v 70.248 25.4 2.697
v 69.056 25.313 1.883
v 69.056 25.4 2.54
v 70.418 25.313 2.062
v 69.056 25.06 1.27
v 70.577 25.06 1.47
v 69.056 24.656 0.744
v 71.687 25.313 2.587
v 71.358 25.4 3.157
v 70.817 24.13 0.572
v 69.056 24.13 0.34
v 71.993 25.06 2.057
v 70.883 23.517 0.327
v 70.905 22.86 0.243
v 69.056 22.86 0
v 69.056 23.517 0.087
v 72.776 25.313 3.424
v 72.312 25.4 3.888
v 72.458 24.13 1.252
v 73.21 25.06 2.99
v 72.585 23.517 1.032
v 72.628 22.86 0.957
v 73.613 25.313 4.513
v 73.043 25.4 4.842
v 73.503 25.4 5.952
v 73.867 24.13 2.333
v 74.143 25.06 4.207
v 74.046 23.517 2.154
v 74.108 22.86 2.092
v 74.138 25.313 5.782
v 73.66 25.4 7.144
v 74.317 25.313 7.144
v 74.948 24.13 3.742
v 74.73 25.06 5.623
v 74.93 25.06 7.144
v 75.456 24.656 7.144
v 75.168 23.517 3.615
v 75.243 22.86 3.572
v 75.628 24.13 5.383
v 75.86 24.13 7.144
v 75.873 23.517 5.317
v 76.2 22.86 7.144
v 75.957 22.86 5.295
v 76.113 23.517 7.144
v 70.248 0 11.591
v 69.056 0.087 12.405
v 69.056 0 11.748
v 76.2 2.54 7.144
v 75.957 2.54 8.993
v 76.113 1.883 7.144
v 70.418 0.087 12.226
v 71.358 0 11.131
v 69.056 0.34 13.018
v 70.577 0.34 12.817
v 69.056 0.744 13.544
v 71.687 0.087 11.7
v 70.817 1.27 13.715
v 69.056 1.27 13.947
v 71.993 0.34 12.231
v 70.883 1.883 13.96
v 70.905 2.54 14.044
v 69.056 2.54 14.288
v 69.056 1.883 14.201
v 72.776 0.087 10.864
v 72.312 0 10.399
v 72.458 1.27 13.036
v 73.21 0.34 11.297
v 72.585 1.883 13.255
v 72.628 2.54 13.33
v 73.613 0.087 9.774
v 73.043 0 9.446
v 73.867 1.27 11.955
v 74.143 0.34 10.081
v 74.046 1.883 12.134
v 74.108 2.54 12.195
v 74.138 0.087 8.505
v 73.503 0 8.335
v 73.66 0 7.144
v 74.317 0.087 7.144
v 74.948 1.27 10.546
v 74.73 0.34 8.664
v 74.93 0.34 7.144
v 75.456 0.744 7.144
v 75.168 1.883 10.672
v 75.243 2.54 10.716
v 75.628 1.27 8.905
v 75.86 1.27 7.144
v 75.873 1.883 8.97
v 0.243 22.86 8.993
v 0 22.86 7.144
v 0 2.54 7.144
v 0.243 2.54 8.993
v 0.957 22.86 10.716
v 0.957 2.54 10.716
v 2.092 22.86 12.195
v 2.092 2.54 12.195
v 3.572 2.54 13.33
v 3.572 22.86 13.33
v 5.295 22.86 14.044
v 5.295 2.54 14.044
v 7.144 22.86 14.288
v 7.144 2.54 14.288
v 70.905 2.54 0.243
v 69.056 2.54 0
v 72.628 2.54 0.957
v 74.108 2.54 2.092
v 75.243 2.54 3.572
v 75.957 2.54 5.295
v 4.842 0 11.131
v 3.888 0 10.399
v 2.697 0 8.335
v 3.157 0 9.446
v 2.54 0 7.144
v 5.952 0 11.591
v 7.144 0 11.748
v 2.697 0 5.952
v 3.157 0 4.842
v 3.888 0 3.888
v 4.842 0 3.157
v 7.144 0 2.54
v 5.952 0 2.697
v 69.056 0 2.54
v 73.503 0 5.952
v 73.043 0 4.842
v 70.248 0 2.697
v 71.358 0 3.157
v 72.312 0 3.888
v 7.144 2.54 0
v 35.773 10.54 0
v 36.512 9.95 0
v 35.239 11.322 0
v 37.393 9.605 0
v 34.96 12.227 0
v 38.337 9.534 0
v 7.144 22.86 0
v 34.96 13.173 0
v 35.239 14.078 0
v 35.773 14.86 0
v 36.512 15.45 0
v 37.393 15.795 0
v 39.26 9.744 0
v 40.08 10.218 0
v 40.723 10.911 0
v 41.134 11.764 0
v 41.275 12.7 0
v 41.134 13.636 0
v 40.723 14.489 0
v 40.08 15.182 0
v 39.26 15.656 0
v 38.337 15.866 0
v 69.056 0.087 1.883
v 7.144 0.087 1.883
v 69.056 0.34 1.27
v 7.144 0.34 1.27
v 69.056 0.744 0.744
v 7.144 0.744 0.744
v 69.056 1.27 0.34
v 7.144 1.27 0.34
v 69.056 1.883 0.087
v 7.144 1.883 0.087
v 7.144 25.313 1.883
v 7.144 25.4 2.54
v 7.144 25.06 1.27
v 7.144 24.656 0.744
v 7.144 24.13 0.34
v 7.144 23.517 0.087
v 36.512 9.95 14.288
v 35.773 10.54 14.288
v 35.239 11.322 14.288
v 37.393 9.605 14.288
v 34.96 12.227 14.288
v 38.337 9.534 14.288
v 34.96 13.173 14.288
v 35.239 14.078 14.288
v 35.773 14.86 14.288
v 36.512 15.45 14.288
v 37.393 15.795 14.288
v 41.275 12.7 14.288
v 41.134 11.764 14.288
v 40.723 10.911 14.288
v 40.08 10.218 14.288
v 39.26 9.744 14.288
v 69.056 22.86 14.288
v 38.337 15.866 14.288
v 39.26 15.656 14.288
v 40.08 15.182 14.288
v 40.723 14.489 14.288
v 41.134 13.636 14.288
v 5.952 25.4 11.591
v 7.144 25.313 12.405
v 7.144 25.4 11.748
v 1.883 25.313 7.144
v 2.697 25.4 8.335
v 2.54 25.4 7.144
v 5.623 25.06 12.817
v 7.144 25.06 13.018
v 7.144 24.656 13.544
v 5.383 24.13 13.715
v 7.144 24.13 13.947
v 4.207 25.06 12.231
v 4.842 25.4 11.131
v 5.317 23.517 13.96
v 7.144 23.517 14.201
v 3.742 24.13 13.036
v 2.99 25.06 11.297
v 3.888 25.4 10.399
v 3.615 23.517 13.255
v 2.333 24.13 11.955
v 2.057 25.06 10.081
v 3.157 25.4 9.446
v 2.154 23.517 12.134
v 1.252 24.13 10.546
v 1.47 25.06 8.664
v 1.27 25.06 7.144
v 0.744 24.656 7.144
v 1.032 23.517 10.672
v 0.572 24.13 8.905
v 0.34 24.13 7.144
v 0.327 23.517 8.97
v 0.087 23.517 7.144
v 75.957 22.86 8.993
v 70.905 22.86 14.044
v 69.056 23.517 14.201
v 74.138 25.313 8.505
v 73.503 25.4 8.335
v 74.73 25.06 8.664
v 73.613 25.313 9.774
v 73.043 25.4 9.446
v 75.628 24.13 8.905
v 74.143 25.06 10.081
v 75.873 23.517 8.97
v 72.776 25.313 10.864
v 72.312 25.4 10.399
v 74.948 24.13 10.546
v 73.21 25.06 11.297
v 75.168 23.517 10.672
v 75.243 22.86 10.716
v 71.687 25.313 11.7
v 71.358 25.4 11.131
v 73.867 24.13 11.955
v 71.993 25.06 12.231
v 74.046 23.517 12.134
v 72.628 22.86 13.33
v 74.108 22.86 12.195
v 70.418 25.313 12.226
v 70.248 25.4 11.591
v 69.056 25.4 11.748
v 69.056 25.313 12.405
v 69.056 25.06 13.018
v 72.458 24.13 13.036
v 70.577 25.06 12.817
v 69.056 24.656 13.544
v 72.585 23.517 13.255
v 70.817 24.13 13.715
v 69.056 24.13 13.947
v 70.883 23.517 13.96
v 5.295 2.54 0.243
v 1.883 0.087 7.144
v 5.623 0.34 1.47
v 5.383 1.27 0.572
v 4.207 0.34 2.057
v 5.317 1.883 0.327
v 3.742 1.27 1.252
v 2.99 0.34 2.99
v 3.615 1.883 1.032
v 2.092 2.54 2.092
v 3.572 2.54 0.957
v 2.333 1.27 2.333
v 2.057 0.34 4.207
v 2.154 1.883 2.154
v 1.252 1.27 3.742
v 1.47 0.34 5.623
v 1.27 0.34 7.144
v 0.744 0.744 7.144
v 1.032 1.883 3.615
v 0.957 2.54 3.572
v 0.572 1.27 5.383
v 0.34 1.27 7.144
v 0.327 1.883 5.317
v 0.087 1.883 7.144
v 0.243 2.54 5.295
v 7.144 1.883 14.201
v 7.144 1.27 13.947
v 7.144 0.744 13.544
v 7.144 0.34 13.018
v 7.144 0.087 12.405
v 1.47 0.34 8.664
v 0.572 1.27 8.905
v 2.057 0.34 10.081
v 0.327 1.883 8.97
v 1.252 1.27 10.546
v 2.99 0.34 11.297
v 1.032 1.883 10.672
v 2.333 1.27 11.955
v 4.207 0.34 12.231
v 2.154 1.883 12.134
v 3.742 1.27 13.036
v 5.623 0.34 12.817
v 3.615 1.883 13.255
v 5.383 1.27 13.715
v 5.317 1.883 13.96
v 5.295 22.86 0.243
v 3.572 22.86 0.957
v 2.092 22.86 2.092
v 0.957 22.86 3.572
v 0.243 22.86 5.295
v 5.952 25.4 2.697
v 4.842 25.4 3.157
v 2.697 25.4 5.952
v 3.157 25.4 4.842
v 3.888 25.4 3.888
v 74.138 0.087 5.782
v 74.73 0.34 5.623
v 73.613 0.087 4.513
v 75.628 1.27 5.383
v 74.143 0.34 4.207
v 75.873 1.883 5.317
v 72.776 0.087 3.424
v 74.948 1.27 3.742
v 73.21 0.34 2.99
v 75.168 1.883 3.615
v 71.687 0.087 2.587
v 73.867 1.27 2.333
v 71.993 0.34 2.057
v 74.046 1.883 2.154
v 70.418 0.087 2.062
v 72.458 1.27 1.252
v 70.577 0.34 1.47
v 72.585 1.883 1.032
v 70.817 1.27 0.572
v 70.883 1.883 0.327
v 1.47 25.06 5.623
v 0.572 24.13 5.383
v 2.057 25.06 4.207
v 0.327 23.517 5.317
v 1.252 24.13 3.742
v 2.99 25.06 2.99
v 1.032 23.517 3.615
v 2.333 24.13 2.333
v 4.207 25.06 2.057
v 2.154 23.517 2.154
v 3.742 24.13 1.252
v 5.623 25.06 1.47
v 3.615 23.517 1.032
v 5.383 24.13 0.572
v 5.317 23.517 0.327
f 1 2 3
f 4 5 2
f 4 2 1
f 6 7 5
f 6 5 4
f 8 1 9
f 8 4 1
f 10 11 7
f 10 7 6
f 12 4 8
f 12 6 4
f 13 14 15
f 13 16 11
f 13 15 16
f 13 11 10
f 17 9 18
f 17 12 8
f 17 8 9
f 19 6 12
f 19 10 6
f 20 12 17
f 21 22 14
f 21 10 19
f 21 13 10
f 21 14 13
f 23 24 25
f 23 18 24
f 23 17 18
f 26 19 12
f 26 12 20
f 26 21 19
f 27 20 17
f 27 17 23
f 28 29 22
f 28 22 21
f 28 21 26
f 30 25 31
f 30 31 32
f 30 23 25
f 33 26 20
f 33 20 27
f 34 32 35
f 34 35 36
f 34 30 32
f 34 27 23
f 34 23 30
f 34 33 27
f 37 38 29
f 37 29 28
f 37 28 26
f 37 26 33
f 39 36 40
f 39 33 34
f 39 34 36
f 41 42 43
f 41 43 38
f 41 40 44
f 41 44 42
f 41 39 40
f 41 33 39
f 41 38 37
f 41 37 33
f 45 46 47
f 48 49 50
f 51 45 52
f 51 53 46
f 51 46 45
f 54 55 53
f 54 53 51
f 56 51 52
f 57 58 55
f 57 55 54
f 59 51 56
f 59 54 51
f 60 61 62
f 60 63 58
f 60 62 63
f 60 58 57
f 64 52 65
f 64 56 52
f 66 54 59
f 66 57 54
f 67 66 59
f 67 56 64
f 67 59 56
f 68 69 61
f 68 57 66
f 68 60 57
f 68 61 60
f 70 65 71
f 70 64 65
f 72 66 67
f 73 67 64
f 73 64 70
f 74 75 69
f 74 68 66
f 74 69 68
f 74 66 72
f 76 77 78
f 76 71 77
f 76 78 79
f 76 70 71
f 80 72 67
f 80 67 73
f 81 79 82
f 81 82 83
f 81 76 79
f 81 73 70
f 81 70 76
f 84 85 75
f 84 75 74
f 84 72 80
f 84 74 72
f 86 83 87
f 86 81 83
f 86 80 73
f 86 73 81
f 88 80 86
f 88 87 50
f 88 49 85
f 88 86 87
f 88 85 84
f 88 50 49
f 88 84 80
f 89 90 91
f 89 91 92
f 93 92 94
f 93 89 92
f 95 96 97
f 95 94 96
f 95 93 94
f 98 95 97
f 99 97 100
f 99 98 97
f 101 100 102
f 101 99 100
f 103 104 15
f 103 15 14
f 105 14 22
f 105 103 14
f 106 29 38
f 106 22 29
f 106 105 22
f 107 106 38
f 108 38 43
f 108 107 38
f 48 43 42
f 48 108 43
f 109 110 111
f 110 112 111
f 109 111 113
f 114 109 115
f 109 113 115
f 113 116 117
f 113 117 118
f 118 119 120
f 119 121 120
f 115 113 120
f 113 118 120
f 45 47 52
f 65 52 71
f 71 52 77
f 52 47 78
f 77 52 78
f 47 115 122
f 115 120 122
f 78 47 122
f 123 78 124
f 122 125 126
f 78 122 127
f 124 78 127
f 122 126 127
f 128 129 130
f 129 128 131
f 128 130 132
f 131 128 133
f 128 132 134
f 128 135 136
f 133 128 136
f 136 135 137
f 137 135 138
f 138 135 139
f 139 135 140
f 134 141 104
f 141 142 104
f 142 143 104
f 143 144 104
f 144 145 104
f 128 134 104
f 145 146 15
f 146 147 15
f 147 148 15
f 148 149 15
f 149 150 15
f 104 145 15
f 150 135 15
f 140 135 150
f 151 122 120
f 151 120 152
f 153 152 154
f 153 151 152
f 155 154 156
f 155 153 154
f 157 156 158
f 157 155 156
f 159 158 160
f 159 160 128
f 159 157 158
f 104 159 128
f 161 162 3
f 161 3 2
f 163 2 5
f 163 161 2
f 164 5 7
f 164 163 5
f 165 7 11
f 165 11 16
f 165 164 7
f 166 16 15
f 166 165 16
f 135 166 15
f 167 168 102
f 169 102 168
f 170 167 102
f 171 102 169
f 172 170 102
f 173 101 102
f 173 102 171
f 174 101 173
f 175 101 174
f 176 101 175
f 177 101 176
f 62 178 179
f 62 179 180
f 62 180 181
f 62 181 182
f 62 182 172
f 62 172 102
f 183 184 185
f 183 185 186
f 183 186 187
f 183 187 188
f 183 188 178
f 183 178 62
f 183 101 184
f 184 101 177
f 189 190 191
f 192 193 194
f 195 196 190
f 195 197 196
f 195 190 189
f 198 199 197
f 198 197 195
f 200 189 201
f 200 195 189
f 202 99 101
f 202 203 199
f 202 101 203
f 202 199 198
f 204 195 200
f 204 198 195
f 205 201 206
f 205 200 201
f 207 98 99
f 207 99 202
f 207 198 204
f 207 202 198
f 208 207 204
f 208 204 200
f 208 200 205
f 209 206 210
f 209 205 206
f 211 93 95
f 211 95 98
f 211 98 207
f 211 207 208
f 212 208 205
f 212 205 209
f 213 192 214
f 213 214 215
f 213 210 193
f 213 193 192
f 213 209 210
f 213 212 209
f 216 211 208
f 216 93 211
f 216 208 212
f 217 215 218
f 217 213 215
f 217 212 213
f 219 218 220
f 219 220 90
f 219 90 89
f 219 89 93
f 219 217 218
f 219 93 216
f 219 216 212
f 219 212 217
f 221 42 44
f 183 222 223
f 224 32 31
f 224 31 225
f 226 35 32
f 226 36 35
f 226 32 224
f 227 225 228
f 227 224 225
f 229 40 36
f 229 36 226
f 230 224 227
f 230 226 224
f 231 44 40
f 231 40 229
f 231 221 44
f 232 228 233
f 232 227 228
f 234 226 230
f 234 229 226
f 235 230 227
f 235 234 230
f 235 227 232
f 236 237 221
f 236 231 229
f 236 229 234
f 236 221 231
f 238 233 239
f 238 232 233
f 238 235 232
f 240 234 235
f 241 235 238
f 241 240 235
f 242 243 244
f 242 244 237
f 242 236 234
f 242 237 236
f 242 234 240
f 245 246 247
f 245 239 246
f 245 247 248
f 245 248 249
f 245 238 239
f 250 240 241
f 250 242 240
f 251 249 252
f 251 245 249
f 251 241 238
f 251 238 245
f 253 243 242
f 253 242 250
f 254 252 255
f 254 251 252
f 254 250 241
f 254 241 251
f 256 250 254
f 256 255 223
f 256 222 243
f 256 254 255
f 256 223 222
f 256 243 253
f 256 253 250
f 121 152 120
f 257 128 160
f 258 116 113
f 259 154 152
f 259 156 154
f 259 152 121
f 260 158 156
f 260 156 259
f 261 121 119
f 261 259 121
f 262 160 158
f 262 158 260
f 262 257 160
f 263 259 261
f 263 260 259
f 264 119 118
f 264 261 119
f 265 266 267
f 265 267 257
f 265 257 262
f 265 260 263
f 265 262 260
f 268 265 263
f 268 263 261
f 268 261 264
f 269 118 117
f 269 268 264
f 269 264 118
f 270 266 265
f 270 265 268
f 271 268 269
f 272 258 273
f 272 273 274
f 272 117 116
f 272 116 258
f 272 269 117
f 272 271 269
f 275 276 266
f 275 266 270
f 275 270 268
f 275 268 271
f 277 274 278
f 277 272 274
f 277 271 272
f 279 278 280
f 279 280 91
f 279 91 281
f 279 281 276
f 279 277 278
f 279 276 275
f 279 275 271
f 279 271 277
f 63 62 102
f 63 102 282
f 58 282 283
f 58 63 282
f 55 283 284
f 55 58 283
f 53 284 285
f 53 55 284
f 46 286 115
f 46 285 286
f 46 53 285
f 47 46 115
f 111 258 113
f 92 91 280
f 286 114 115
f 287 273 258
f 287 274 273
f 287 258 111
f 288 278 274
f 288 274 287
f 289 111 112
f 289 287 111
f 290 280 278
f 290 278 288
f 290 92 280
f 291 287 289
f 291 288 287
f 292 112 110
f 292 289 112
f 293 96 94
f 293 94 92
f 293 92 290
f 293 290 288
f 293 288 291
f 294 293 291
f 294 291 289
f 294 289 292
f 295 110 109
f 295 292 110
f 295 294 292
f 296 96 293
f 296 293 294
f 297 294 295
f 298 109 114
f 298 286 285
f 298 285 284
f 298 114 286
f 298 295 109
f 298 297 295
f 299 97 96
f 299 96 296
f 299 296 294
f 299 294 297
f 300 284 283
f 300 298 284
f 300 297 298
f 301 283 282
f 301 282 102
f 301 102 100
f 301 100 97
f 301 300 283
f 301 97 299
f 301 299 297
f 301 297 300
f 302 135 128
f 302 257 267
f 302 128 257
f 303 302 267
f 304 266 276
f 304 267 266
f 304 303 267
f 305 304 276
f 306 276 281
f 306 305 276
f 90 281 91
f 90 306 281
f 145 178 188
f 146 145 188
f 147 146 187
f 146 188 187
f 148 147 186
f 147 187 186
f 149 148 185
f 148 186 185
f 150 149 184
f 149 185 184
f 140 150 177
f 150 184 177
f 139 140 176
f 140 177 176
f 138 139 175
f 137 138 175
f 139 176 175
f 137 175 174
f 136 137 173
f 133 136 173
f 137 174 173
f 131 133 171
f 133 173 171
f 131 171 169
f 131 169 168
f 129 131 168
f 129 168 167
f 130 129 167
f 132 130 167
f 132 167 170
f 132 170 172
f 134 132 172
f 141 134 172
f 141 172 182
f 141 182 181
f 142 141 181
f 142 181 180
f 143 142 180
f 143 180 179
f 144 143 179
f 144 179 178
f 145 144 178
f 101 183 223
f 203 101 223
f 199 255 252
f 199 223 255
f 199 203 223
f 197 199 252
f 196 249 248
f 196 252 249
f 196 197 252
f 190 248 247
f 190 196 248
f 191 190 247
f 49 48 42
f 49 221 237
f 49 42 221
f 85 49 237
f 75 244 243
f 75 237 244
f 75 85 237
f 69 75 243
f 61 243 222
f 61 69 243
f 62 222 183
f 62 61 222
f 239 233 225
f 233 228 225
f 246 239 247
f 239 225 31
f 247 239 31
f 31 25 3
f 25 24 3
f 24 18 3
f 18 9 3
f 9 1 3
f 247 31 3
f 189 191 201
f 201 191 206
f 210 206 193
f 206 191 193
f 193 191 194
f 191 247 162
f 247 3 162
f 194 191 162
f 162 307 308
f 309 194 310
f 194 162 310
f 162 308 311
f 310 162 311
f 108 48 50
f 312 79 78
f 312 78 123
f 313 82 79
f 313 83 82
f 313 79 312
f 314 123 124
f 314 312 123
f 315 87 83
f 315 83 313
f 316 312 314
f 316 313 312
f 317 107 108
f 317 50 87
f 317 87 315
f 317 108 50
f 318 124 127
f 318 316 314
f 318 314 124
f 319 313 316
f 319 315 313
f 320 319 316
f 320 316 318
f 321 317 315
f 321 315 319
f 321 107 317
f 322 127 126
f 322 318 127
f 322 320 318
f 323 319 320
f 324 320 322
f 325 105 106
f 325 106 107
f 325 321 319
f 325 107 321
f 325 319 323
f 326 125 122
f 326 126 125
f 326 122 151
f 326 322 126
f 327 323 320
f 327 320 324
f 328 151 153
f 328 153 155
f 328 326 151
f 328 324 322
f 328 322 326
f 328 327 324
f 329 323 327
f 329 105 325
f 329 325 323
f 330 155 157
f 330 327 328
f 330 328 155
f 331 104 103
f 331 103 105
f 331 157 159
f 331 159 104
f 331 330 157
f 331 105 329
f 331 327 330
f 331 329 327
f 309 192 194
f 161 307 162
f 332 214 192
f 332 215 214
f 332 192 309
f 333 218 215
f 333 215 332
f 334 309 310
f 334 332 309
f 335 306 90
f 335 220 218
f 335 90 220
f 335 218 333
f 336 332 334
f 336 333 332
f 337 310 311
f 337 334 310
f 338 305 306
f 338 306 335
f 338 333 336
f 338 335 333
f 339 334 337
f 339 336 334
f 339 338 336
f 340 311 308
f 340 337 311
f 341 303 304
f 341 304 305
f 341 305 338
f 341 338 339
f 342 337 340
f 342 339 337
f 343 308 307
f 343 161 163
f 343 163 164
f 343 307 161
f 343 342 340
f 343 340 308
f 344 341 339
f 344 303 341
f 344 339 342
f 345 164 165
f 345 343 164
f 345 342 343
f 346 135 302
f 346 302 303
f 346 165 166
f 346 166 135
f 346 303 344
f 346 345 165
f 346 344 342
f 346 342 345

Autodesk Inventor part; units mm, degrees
ref_plane "YZ Plane" through (0, 0, 0) normal (1, 0, 0) x (0, 1, 0)
ref_plane "XZ Plane" through (0, 0, 0) normal (0, 1, 0) x (-1, 0, 0)
ref_plane "XY Plane" through (0, 0, 0) normal (0, 0, 1) x (1, 0, 0)
sketch "Sketch1" plane through (0, 0, 0) normal (0, 0, 1) x (1, 0, 0)
  line L0 (0, 0) -> (76.2, 0)
  line L1 (76.2, 0) -> (76.2, 25.4)
  line L2 (76.2, 25.4) -> (0, 25.4)
  line L3 (0, 25.4) -> (0, 0)
  dimension "d0" = 76.2
  dimension "d1" = 25.4
extrude "Extrusion1" add sketch "Sketch1" along normal blind 14.2875
fillet "Fillet1" radius 2.54 8 edges at (38.1, 25.4, 14.2875) (38.1, 0, 14.2875) (76.2, 0, 7.1437) (76.2, 25.4, 7.1437) (0, 25.4, 7.1437) (0, 0, 7.1437) (38.1, 25.4, 0) (38.1, 0, 0)
sketch "Sketch2" plane through (0, 0, 14.2875) normal (0, 0, 1) x (1, 0, 0)
  line L0 (2.54, 2.54) -> (2.54, 22.86) projected
  line L1 (2.54, 12.7) -> (73.66, 12.7)
  line L2 (73.66, 22.86) -> (73.66, 2.54) projected
  circle A0 centre (38.1, 12.7) radius 3.175
  point P0 (0, 0)
  dimension "d5" = 6.35
extrude "Extrusion2" cut sketch "Sketch2" against normal blind 14.2875
thread "Thread1" size "1/4-20 UNC" class "2B" standard "ANSI Unified Screw Threads" full length
fillet "Fillet2" radius 7.1437 12 edges at (75.4561, 24.6561, 13.5436) (75.4561, 0.7439, 13.5436) (76.2, 12.7, 14.2875) (75.4561, 24.6561, 0.7439) (75.4561, 0.7439, 0.7439) (76.2, 12.7, 0) (0.7439, 0.7439, 13.5436) (0.7439, 24.6561, 13.5436) (0, 12.7, 14.2875) (0.7439, 0.7439, 0.7439) (0.7439, 24.6561, 0.7439) (0, 12.7, 0)
properties part number "bolt" material "Zinc"
